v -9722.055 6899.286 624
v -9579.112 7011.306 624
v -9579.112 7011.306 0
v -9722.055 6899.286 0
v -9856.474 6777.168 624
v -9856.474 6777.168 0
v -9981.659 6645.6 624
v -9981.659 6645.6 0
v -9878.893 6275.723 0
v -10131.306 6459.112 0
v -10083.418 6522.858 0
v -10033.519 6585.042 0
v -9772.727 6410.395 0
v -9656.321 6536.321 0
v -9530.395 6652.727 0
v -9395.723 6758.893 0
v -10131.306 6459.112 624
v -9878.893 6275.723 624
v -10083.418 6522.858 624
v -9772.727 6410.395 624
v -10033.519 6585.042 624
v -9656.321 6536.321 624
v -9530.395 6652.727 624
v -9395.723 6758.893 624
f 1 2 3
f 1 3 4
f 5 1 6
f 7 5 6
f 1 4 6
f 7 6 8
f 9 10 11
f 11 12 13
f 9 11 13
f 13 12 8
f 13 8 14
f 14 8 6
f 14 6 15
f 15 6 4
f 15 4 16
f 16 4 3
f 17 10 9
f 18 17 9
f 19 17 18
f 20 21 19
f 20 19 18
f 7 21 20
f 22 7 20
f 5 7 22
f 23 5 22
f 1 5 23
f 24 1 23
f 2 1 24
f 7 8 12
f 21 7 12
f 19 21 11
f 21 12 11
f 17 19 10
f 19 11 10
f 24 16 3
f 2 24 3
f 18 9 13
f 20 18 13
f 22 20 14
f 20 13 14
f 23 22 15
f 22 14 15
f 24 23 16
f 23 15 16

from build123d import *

# Parameters (mm, degrees)
EXTRUDE_1_DEPTH = 480
SCALE_1_SCALE   = 1.3


with BuildPart() as part:
    # 草图1 → 凸台-拉伸1 (new body)
    with BuildSketch(Plane.XY):
        with BuildLine():
            Line((-7793.3126292, 4968.547684402), (-7599.14855055, 4827.479223851))
            ThreePointArc((-7599.14855055, 4827.479223851), (-7427.939392393, 5027.939392393), (-7227.479223851, 5199.14855055))
            Line((-7227.479223851, 5199.14855055), (-7368.547684402, 5393.3126292))
            ThreePointArc((-7368.547684402, 5393.3126292), (-7531.058159836, 5261.115346452), (-7678.198873592, 5112))
            ThreePointArc((-7678.198873592, 5112), (-7737.474510483, 5041.653065761), (-7793.3126292, 4968.547684402))
        make_face()
    extrude(amount=EXTRUDE_1_DEPTH)


with BuildPart() as part_1:
    # 缩放比例1: scaled about (0, 0, 0)
    add(part.part.scale(SCALE_1_SCALE))


solid = part_1.part
